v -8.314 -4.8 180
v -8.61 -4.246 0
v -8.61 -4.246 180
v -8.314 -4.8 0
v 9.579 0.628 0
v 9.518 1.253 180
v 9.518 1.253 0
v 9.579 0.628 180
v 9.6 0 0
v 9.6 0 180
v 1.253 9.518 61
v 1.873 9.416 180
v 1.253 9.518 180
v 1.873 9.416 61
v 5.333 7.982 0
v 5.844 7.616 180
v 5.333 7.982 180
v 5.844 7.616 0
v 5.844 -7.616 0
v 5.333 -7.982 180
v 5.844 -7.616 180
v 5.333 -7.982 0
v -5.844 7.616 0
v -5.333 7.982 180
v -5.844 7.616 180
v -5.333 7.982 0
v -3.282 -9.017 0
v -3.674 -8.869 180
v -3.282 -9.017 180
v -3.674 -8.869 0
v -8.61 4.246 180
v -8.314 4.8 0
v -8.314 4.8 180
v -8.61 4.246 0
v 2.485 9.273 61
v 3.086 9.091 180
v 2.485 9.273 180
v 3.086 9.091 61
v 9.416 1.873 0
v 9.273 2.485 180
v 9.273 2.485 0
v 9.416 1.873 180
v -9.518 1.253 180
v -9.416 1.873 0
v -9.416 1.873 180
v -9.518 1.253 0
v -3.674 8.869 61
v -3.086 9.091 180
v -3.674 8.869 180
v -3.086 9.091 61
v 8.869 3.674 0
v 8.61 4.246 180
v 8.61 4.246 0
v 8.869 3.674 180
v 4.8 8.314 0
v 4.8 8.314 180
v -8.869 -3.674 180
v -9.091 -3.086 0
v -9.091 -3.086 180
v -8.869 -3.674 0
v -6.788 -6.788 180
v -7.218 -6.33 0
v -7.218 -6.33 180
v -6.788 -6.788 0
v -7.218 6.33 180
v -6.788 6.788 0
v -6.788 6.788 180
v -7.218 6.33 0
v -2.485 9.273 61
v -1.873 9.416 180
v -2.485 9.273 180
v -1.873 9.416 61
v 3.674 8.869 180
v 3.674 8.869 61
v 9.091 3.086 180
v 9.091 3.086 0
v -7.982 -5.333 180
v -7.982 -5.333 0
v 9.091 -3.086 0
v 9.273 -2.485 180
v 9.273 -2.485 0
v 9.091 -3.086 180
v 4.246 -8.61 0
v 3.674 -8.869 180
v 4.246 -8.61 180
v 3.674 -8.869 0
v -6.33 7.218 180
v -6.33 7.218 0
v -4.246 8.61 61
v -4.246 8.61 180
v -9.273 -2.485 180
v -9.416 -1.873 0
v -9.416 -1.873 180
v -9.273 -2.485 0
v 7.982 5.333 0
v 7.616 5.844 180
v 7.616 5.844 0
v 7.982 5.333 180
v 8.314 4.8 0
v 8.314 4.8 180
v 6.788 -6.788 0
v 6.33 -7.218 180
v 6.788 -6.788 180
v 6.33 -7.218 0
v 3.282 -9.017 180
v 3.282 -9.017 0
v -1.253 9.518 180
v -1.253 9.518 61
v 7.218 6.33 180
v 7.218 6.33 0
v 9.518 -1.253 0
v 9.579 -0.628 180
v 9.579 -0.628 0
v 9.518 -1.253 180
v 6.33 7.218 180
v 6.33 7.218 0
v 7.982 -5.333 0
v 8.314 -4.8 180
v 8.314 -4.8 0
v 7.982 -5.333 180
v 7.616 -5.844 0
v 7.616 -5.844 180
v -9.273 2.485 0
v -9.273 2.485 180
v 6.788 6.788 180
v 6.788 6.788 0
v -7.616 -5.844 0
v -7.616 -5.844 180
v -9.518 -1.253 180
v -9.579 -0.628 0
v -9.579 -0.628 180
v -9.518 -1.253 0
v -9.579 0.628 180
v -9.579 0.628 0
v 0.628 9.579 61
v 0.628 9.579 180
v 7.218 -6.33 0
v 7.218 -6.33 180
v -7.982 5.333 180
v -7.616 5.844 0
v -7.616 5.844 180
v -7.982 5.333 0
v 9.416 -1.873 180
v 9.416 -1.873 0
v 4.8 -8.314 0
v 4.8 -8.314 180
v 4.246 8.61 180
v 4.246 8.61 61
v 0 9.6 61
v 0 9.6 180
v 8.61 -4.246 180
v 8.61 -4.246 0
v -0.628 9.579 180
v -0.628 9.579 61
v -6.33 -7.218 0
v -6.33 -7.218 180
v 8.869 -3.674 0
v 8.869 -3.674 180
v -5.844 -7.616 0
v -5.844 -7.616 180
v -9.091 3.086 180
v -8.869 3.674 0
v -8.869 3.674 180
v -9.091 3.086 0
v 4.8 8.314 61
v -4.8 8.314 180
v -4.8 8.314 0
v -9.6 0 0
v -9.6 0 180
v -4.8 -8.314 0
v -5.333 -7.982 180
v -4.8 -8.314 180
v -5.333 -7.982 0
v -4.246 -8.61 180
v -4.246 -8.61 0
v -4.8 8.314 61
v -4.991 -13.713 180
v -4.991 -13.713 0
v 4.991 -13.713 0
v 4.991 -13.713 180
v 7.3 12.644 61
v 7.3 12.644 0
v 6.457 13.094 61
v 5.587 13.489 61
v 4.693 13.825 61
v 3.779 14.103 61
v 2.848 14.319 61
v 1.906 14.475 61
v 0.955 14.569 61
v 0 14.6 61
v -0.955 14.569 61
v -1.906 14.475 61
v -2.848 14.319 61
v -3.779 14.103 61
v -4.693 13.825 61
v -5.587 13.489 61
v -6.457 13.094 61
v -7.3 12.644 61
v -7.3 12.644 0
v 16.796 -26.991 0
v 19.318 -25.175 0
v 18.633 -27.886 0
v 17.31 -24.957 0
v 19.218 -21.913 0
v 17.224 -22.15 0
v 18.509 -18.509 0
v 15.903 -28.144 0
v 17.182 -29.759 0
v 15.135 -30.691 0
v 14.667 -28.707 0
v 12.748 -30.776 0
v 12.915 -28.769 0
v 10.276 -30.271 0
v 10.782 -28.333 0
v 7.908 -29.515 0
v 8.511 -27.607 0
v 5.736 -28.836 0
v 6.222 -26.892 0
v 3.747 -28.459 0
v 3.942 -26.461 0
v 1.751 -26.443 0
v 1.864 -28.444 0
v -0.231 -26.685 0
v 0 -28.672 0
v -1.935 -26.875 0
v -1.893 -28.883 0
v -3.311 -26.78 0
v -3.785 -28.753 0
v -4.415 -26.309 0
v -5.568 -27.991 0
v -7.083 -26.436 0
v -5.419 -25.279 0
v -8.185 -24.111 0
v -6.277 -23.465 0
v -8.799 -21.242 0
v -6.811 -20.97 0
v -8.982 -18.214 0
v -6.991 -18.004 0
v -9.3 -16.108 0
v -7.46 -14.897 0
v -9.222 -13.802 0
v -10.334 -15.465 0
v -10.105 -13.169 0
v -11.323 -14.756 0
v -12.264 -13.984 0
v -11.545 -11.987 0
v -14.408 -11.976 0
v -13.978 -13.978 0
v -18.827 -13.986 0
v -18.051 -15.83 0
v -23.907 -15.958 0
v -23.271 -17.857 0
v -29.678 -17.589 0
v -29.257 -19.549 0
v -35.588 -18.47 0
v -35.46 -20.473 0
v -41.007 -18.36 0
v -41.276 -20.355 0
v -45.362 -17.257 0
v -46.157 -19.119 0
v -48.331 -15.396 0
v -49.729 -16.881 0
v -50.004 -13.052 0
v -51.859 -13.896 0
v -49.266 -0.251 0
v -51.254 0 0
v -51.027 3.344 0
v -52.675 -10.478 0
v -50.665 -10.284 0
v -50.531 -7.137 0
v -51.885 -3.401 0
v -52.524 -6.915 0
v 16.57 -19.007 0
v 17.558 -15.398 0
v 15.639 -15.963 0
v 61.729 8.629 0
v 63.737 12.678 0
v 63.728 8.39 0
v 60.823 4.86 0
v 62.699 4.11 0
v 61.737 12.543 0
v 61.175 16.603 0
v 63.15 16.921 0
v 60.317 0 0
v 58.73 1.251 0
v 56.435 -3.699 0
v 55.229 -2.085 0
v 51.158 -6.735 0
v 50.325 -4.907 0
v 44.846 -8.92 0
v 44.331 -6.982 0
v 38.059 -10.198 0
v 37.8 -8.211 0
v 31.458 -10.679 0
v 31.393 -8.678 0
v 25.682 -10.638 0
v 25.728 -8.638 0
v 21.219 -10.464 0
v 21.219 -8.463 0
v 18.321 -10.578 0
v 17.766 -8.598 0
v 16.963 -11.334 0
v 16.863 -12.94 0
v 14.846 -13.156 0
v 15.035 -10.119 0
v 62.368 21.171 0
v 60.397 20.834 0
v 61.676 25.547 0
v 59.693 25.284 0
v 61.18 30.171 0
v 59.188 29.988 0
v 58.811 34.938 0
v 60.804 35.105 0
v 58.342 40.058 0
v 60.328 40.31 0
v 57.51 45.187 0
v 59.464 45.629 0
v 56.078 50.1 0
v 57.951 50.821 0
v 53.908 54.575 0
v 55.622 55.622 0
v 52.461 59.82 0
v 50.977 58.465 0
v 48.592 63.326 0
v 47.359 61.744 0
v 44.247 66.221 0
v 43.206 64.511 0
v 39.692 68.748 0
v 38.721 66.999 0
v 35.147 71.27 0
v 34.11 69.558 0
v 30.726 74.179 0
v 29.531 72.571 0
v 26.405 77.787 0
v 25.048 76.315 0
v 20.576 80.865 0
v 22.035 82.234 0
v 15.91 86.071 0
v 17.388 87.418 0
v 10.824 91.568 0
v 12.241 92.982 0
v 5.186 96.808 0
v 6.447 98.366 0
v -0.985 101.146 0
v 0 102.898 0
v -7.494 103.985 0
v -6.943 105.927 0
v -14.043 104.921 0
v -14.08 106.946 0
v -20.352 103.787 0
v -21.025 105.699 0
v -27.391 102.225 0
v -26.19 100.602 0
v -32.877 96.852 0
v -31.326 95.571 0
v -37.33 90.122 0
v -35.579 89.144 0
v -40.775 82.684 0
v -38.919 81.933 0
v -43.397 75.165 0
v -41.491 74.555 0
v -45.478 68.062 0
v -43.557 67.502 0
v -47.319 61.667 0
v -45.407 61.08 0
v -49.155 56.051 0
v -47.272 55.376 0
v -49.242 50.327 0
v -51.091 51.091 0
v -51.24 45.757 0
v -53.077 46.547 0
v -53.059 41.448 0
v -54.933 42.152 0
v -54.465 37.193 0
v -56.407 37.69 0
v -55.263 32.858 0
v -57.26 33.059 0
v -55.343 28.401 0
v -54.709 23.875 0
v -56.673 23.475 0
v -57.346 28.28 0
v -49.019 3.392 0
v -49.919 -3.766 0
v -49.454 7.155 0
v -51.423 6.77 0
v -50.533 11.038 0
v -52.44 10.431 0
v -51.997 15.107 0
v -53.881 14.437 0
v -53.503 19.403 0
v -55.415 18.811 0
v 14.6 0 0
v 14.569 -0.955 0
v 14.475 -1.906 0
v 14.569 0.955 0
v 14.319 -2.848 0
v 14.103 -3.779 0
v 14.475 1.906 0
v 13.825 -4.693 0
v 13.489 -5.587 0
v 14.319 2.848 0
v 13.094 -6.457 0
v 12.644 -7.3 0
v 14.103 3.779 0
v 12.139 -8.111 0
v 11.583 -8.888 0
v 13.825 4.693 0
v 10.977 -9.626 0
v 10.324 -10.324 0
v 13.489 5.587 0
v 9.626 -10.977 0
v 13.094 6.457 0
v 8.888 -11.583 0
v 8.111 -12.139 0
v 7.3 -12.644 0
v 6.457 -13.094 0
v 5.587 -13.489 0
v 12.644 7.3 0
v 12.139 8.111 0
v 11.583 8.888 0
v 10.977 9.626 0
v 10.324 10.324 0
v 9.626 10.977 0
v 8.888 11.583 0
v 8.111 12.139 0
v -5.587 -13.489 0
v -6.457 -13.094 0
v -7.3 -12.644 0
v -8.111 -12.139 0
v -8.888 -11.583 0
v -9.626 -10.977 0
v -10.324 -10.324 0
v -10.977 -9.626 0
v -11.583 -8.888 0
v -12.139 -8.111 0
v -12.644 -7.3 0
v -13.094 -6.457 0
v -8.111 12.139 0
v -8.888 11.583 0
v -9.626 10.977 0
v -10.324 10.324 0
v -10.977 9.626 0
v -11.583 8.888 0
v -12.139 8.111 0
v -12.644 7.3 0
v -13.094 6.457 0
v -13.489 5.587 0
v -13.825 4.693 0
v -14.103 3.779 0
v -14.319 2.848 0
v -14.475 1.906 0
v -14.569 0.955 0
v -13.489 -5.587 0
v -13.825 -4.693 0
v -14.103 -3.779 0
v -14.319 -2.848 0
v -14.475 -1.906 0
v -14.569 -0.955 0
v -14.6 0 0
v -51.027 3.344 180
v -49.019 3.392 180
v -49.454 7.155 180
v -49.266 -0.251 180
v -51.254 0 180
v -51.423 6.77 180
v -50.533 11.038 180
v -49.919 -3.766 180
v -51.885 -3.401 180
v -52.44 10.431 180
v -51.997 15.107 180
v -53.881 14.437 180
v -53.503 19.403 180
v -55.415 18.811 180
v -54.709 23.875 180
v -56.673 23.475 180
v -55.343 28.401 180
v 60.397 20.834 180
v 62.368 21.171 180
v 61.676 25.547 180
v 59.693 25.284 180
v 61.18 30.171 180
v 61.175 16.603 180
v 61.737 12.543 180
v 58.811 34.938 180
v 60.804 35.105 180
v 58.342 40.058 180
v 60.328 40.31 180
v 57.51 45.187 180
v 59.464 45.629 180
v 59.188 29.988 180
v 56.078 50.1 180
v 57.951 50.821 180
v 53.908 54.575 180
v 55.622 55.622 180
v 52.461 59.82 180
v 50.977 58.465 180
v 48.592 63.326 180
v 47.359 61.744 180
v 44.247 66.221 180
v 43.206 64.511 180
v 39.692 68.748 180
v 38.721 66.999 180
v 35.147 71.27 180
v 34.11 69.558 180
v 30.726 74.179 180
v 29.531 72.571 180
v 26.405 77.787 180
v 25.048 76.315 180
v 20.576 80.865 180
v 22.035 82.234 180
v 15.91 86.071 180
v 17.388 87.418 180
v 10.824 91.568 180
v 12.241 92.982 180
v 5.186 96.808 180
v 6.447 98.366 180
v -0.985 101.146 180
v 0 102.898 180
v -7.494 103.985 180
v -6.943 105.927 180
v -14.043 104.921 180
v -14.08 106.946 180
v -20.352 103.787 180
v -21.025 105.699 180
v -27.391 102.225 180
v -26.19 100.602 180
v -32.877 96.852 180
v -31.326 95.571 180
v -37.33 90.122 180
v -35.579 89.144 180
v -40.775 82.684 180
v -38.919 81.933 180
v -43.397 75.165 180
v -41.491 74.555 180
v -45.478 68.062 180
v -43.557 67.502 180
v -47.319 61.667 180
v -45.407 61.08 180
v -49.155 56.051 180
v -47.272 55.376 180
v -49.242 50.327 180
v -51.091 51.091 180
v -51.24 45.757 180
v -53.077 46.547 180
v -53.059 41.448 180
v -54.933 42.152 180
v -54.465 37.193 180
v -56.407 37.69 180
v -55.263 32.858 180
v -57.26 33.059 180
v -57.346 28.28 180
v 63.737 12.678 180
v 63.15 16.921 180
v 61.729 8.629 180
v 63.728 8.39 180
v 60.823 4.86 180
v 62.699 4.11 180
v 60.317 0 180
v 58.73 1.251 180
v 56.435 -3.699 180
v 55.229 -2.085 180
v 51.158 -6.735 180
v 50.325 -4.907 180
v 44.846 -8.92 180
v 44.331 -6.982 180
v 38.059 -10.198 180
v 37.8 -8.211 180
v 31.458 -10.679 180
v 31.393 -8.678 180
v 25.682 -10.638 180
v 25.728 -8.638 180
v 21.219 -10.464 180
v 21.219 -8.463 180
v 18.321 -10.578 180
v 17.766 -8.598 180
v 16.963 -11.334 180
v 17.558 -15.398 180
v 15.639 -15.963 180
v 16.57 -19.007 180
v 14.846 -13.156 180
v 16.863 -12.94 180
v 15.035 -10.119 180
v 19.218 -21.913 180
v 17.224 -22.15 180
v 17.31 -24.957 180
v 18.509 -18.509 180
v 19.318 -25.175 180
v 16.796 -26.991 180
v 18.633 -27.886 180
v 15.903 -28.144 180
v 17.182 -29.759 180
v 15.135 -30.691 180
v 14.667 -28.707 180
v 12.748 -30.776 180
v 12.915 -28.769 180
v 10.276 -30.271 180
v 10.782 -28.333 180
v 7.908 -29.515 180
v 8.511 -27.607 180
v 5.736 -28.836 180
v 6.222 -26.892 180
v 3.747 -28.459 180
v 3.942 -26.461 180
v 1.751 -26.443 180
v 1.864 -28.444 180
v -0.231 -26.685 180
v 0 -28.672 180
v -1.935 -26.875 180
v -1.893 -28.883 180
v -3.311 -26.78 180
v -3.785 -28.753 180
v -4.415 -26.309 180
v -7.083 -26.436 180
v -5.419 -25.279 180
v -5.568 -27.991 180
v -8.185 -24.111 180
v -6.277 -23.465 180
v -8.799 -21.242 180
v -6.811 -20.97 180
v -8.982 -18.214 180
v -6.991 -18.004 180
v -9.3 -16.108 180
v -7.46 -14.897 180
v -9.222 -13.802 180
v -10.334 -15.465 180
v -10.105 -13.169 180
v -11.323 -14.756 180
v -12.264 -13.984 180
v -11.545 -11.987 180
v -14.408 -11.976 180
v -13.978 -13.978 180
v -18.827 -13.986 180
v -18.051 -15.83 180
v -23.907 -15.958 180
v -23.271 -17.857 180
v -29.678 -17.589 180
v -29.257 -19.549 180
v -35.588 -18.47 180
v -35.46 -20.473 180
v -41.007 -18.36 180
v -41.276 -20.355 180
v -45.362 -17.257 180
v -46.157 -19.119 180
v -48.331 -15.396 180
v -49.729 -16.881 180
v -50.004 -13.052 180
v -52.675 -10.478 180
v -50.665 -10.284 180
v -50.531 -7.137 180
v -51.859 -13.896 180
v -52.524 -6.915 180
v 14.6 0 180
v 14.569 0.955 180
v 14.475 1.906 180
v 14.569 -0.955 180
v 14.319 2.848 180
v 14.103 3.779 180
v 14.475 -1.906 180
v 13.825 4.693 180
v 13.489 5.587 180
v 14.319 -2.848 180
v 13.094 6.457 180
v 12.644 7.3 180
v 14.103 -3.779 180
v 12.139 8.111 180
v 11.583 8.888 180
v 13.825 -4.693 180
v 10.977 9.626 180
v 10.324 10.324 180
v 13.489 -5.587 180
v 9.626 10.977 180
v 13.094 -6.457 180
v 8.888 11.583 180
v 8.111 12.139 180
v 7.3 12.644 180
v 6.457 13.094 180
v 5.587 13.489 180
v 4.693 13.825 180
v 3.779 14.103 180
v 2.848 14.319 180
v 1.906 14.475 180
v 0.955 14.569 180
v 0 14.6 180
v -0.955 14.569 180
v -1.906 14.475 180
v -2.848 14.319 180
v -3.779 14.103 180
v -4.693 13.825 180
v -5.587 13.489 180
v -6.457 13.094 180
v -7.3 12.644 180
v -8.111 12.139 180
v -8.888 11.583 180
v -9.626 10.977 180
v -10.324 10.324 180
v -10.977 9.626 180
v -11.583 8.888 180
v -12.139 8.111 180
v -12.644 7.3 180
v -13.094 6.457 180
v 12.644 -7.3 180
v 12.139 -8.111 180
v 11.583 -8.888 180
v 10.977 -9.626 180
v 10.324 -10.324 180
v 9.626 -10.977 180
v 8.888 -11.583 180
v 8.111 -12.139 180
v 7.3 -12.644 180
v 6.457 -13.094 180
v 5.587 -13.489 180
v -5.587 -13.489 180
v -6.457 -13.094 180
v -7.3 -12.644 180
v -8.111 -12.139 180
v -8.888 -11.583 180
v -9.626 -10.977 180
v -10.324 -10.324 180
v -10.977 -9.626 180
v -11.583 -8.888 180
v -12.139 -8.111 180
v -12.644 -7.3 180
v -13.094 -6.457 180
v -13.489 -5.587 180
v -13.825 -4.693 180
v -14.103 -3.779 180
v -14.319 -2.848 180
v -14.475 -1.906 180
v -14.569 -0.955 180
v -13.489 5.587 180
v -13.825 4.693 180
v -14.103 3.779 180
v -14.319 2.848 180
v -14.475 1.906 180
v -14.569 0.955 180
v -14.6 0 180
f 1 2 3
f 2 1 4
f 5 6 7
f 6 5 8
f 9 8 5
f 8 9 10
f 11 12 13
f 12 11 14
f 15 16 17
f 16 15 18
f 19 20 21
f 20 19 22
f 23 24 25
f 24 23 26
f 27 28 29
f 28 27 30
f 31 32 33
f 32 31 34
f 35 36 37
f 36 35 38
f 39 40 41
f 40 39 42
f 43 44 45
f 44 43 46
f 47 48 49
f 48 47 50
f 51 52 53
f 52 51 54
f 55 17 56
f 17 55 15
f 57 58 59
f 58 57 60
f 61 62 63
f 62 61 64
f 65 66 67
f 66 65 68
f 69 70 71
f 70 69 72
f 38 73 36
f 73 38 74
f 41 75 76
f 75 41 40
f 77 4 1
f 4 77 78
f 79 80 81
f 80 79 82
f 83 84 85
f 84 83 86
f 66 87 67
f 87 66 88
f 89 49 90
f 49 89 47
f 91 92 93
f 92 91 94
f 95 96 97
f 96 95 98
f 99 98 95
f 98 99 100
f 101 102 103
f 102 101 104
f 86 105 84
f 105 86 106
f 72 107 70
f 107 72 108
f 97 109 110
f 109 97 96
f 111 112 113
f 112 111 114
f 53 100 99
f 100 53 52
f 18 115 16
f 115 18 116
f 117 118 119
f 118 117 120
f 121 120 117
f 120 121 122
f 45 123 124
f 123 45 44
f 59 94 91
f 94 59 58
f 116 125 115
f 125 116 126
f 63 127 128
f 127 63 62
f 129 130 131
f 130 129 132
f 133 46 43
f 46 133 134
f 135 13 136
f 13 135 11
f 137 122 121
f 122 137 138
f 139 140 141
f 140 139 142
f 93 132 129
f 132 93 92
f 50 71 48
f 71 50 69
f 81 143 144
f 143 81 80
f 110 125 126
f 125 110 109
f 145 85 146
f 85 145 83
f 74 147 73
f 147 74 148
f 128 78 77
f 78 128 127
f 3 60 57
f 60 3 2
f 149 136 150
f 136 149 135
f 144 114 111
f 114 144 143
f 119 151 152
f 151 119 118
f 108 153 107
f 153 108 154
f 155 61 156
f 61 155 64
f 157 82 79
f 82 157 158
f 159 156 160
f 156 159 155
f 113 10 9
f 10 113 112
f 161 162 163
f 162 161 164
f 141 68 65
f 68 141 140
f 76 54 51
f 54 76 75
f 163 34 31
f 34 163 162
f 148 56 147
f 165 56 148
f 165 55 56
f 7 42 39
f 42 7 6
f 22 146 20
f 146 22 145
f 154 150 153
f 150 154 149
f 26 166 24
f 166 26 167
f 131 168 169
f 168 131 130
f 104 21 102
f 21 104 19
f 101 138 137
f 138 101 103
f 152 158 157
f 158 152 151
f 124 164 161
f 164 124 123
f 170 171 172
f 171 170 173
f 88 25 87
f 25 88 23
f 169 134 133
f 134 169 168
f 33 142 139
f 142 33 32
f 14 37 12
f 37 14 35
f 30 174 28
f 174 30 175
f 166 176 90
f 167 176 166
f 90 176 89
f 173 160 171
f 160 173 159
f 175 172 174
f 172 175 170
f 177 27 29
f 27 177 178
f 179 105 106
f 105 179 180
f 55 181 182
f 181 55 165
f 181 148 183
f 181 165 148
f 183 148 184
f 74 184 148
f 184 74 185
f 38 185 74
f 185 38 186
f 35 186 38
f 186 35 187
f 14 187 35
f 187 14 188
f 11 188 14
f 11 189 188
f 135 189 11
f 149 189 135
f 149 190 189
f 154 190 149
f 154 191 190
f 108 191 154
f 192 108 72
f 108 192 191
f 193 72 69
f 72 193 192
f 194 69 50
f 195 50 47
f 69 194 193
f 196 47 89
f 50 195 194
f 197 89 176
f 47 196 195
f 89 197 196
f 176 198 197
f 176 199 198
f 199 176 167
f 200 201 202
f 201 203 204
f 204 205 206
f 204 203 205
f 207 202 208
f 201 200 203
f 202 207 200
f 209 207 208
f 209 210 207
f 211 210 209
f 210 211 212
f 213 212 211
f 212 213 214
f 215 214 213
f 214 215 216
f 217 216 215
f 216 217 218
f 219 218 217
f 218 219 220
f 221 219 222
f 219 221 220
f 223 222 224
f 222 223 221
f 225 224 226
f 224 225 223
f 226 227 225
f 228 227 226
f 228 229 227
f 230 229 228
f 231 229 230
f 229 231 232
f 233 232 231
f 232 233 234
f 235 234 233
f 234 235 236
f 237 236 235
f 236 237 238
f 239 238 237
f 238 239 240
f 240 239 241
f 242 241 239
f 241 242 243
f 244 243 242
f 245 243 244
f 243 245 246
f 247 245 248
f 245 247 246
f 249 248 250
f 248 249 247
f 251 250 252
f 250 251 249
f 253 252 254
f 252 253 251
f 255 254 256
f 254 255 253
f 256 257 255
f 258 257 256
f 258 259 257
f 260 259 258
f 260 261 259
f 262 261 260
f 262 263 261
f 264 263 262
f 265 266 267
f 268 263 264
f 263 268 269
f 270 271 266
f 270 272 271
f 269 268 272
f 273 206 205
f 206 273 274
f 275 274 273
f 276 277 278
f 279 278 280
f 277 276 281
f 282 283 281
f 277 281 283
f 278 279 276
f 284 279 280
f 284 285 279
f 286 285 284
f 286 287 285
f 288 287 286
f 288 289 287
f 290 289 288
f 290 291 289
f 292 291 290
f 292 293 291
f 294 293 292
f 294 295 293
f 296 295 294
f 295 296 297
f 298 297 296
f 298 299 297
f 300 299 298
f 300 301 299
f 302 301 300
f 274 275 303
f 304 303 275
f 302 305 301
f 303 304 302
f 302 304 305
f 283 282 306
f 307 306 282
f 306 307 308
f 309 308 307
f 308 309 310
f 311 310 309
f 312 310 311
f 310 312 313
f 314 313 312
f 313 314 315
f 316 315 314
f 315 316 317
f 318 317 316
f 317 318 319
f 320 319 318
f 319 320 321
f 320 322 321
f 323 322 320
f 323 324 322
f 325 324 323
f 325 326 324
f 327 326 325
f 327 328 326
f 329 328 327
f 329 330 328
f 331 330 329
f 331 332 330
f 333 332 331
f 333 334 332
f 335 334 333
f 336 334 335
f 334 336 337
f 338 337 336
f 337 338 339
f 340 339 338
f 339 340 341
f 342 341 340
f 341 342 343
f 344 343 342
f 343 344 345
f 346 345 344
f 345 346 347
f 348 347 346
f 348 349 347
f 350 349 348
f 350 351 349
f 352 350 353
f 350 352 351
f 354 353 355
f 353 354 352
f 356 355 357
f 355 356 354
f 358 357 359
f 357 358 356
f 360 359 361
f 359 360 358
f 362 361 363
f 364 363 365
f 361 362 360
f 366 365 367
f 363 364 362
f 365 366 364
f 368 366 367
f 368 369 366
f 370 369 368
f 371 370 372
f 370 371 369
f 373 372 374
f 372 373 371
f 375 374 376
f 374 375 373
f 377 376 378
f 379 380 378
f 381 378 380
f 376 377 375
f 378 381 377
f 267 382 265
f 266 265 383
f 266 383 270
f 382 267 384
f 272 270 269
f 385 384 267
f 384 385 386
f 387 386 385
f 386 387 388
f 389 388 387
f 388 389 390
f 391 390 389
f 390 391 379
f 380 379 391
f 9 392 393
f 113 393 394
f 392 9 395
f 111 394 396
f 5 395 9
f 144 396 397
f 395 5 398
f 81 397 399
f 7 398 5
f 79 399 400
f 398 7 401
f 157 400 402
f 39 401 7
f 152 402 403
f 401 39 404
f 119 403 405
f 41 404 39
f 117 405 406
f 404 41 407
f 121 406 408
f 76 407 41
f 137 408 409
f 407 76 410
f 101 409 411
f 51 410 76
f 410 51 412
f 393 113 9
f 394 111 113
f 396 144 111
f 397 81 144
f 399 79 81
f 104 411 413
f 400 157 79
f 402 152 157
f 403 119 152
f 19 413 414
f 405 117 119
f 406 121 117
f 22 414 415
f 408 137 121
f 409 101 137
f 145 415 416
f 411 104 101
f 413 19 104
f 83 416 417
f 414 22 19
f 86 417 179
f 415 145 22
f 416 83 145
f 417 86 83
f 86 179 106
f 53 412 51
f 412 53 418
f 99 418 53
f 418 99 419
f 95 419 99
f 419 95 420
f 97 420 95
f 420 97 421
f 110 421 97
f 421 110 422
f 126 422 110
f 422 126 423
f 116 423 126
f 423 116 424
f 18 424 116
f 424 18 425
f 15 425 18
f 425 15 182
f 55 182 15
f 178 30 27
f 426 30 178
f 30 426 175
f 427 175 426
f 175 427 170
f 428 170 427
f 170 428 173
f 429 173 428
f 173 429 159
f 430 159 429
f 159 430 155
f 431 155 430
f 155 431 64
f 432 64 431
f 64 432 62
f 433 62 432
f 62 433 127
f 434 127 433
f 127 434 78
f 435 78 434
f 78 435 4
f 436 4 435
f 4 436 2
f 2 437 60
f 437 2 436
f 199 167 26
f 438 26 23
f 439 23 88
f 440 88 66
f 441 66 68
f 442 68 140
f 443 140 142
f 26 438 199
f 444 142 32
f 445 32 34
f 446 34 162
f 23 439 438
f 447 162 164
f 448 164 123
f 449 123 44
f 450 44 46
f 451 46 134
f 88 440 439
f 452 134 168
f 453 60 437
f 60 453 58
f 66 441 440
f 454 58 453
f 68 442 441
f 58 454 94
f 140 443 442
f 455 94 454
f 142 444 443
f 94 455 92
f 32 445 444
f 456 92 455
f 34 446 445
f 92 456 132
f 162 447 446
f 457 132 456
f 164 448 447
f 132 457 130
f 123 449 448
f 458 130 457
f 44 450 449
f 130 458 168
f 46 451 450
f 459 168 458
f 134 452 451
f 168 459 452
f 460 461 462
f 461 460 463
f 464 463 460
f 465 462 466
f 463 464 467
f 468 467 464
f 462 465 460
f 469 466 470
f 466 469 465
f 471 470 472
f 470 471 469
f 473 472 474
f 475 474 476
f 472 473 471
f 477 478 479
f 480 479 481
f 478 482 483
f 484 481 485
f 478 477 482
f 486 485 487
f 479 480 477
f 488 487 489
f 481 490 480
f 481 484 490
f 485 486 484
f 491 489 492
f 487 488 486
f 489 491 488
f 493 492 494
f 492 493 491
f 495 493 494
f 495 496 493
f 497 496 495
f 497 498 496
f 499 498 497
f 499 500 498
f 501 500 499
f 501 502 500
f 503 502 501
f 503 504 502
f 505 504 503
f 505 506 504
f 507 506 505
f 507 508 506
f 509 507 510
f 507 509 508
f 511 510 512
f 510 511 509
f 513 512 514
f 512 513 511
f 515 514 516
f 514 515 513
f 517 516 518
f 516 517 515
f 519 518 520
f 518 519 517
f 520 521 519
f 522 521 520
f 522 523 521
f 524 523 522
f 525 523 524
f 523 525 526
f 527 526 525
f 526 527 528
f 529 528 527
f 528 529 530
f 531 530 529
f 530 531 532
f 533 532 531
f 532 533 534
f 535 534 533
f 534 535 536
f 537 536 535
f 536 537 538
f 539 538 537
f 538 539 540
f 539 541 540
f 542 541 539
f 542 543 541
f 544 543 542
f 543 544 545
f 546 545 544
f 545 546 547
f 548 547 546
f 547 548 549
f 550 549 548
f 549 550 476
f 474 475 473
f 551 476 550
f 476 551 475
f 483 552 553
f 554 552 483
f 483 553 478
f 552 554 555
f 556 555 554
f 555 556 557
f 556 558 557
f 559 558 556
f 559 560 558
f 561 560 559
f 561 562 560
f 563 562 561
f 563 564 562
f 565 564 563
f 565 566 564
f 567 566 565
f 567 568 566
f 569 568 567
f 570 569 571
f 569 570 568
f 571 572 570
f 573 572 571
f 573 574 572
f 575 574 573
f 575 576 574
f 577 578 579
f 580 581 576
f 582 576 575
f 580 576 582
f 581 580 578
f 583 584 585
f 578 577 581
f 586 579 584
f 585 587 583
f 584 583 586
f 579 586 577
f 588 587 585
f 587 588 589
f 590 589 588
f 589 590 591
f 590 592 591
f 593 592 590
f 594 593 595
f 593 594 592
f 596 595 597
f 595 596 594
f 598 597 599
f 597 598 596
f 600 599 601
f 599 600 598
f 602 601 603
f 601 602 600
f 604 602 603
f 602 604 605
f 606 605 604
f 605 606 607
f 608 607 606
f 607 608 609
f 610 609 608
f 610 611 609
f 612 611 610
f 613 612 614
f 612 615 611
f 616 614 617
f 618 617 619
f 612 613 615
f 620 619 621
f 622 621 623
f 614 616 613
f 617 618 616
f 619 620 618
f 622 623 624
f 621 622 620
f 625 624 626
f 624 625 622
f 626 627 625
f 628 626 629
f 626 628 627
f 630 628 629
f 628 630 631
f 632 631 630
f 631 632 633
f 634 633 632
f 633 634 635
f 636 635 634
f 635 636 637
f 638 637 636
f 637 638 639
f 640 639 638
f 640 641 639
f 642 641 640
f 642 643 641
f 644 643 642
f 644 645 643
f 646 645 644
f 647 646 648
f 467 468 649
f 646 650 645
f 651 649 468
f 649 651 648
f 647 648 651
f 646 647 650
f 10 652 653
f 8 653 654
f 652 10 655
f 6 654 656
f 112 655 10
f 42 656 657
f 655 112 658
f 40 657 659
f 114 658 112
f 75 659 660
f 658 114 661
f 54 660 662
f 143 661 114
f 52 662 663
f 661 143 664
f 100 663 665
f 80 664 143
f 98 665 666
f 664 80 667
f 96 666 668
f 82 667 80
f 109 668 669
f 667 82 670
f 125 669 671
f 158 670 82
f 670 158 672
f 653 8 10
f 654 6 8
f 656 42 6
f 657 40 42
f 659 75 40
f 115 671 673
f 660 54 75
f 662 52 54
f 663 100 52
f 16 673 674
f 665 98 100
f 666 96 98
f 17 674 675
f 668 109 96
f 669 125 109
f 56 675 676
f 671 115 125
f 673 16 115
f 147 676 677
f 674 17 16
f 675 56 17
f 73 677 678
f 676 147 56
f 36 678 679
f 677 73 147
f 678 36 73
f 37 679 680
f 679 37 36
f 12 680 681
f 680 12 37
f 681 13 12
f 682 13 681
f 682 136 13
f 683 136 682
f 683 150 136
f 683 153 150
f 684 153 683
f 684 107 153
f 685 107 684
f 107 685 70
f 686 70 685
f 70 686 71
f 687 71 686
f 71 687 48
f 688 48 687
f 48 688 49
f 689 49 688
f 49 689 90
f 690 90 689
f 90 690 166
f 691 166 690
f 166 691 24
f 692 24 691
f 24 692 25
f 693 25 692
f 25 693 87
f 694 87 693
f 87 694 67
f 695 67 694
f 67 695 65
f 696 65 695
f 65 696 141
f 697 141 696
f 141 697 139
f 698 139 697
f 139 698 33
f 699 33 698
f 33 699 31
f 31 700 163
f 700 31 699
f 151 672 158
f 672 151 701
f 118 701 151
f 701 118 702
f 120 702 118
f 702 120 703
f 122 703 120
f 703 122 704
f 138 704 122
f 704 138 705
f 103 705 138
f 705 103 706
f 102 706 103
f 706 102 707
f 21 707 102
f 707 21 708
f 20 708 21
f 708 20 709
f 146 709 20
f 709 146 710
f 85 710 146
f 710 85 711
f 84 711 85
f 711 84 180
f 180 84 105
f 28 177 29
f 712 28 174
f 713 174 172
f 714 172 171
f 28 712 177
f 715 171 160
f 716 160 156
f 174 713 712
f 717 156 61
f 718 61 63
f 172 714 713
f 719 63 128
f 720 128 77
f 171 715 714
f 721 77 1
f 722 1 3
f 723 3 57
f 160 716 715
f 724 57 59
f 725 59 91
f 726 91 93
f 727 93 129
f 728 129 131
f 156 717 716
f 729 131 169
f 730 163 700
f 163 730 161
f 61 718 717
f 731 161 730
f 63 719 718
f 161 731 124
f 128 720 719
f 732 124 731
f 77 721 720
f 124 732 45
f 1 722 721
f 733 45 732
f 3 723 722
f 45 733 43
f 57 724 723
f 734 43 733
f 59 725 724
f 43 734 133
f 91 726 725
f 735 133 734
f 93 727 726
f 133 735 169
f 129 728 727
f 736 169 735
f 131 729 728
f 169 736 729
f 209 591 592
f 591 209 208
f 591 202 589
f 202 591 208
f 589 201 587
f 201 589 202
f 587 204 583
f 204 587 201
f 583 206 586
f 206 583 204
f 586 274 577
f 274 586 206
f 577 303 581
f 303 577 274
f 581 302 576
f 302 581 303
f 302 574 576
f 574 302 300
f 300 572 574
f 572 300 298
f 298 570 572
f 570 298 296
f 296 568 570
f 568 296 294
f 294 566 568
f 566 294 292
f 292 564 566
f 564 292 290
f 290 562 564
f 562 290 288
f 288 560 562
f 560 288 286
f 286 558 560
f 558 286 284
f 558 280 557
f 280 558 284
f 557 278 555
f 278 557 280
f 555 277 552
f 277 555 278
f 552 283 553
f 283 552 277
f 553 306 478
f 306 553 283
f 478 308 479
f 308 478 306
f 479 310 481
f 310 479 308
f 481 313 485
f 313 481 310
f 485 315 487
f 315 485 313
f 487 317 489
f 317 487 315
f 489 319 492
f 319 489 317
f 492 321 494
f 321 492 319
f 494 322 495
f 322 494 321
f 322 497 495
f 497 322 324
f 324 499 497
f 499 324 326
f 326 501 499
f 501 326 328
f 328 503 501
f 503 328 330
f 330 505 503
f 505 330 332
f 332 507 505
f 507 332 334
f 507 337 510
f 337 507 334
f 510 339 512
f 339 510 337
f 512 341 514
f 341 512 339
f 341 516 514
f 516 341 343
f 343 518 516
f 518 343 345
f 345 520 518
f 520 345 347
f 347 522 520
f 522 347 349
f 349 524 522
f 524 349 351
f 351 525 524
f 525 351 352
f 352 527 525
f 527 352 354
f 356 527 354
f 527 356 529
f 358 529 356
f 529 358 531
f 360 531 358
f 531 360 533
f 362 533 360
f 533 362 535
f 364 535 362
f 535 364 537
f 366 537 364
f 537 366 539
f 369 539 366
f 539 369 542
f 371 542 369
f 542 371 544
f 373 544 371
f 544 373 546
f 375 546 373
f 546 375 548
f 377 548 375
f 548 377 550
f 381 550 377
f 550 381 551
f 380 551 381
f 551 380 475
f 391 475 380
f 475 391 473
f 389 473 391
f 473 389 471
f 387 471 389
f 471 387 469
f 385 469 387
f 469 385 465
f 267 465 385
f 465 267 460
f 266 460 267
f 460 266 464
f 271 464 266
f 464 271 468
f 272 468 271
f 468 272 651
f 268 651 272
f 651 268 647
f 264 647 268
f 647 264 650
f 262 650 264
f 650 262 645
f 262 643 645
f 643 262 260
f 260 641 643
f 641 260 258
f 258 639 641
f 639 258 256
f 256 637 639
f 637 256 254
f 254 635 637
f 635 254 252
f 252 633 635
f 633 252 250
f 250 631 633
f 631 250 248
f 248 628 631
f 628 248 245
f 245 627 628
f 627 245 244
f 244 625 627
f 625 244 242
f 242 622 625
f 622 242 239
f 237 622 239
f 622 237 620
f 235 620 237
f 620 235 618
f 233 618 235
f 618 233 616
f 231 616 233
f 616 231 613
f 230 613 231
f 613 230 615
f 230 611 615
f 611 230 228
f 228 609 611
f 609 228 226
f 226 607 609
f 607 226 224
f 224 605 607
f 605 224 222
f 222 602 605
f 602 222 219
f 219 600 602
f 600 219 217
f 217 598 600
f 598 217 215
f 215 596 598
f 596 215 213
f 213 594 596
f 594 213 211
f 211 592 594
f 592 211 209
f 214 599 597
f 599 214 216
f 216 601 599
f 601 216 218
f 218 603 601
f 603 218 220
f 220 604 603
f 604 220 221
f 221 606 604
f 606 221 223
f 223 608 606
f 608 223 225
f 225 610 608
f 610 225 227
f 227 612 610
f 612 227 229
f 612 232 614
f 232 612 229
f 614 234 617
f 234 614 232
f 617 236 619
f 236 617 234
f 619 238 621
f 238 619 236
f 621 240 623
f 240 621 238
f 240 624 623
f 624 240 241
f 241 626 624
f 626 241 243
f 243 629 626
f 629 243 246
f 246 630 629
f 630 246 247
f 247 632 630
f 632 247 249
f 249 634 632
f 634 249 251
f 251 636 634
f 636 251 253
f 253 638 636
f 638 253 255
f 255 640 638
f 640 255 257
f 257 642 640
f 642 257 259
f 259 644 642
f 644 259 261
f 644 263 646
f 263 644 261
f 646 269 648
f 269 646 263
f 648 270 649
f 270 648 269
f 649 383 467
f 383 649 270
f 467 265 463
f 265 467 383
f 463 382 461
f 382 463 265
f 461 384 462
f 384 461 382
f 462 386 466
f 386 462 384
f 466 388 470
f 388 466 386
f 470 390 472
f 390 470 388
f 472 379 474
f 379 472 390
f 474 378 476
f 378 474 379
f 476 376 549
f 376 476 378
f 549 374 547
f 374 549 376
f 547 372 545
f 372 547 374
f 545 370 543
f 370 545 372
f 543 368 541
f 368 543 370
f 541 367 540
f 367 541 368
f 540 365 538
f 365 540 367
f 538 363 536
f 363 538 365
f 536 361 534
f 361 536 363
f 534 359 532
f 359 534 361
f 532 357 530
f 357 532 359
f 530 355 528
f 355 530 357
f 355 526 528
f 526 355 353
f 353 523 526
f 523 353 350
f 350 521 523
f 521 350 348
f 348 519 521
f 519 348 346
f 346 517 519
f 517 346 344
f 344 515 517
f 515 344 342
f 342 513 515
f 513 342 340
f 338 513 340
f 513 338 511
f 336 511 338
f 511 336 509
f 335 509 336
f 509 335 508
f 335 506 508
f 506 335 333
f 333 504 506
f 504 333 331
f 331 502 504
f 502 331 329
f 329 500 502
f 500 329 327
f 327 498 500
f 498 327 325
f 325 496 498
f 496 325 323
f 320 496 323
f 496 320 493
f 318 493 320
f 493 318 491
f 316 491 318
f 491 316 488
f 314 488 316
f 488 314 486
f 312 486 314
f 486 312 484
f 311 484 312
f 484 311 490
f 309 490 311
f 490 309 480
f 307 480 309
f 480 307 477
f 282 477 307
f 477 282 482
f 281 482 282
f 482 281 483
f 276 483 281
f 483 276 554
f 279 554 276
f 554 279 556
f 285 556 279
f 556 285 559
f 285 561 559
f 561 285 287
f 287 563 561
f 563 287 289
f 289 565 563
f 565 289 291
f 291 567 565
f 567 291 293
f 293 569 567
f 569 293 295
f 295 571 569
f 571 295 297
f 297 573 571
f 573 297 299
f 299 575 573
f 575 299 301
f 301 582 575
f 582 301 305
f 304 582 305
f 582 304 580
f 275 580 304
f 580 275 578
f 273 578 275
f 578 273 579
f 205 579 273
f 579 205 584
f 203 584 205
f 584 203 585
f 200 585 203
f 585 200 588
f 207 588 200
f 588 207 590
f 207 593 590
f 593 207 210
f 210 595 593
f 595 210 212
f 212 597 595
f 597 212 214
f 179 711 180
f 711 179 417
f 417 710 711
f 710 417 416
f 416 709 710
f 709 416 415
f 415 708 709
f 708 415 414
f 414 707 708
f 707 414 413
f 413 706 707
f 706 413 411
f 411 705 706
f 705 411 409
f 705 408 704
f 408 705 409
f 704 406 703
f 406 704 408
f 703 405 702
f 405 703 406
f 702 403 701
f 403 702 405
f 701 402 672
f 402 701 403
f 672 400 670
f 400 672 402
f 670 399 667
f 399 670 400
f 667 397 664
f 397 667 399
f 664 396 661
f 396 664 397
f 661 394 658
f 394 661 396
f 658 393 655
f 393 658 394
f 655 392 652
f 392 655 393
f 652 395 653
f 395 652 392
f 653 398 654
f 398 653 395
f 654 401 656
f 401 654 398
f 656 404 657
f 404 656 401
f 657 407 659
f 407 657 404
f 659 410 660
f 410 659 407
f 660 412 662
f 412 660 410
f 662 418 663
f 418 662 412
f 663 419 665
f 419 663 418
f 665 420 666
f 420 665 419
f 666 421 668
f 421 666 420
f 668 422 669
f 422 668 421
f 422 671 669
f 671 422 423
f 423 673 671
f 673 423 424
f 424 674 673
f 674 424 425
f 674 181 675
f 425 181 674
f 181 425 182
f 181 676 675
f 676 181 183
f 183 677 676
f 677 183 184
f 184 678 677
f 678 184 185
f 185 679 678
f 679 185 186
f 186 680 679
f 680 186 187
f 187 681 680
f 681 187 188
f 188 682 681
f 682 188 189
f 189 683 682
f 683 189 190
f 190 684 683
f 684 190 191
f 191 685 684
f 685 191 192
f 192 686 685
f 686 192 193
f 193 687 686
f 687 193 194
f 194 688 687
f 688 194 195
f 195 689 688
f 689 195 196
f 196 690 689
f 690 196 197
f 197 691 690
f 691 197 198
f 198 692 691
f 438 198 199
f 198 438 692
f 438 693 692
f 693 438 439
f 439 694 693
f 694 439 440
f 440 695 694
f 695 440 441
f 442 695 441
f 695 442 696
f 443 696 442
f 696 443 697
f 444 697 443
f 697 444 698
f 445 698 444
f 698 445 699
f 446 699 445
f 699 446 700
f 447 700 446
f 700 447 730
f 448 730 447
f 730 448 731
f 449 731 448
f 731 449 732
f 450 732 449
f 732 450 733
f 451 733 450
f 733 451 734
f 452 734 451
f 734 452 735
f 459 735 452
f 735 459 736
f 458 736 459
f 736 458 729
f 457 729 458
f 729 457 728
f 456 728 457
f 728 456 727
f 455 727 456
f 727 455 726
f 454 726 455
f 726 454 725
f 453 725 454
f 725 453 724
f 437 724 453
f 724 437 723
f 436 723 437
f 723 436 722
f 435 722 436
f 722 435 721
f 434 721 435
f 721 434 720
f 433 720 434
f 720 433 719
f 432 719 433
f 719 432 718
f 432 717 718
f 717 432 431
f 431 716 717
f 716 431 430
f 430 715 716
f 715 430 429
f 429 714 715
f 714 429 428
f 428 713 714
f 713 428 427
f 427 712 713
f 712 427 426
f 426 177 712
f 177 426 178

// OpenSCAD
// Lampenschirm für Stehlampe – organischer, wellenförmiger Querschnitt
// mit Klemmkragen, der in die Form integriert ist (keine D-Form mehr)
// Alle Maße in Millimetern (Regel: units-mm)
//
// Kontext: context/printer.md, context/tolerances.md und context/materials.md
// waren zum Zeitpunkt der Modellierung leer (siehe Regel: context-first).
// Annahmen aus dem Design-Dialog (siehe auch 001/002):
//   - Baubett >= 200mm Z-Höhe vorhanden -> Schirm wird als ein Teil,
//     stehend, in voller Höhe gedruckt.
//   - Klemmkragen als offener Federclip (C-Ring): Innendurchmesser 0.8mm
//     unter Stangendurchmesser (19.2mm ID auf 20mm Stange) für Vorspannung.
//   - E14-Fassung wird separat an der Stange montiert.
//
// Änderungen gegenüber 002 (Nutzer-Feedback: "weg von der D-Form, organischer"):
//   - Der Querschnitt ist jetzt eine glatte, asymmetrische, wellenförmige
//     Freiform-Kurve (Fourier-Basisform + zwei Wellen-Harmonische) statt
//     flacher Rückseite + halbovaler Front. Bleibt weiterhin als konstanter
//     Querschnitt über die volle Höhe extrudiert (keine Verjüngung).
//   - Die Rückseite hat keine scharfe Kante mehr: die Kontur läuft glatt um
//     den Klemmkragen herum. Der Kragen ist dadurch kein aufgesetzter
//     Zylinder mehr, sondern eine massive "Boss"-Zone innerhalb der
//     ohnehin an dieser Stelle dickeren organischen Wand.
//   - Sicherheitsabstand (min_r / boss_r) stellt rechnerisch sicher, dass
//     die Wellenkontur den Klemmkragen nie schneidet, auch nicht an den
//     tiefsten Punkten der Welle.

// ---- Parameter ----
shade_height = 180;   // Gesamthöhe des Schirms
wall_t       = 2;     // Wandstärke Schirm (dünn für Lichtdurchlässigkeit)

rod_d      = 20;                 // Durchmesser der Metallstange
rod_r      = rod_d / 2;
clip_id    = 19.2;               // Innendurchmesser Klemmkragen (Vorspannung, ~0.8mm Untermaß)
clip_r_in  = clip_id / 2;
clip_wall  = 3;                  // Wandstärke Klemmkragen (dicker als Schirmwand, für Klemmkraft)
clip_r_out = clip_r_in + clip_wall;
clip_gap_deg = 40;               // Öffnungswinkel des C-Rings (Montagespalt, zeigt nach -Y)

socket_slot_deg    = 60;              // Öffnungswinkel des Fassungs-Schlitzes (Innenseite, +Y) - Annahme
socket_slot_height = shade_height / 3; // unteres Drittel der Klemme ist auf der Innenseite offen

// Organische Grundform (Fourier-Basis, Radius in mm ab Stangenmitte):
// front (θ=90°, +Y) ≈ 95mm, Seiten (θ=0°/180°) ≈ 50mm, Rückseite (θ=270°, -Y) ≈ 25mm
base_a0 = 55;
base_a1 = 35;
base_a2 = 5;

// Wellen-Überlagerung für den organischen/wellenförmigen Look
wave_amp1 = 9;   wave_freq1 = 4;  wave_phase1 = 40;
wave_amp2 = 5;   wave_freq2 = 7;  wave_phase2 = 115;

min_r = clip_r_out + 6;   // harte Untergrenze: Kontur darf den Klemmkragen nie schneiden
boss_r = clip_r_out + 2;  // Radius der massiven Zone um den Klemmkragen (liegt sicher innerhalb min_r - wall_t)

$fn = 96;

// Radius der organischen Kontur in Abhängigkeit vom Winkel θ (Grad)
function organic_r(theta) =
    let(phi = theta - 90)
    let(base = base_a0 + base_a1 * cos(phi) + base_a2 * cos(2 * phi))
    let(wave = wave_amp1 * sin(wave_freq1 * theta + wave_phase1)
             + wave_amp2 * sin(wave_freq2 * theta + wave_phase2))
    max(base + wave, min_r);

// Geschlossenes 2D-Profil der organischen Außenkontur
module organic_outline() {
    step = 360 / $fn;
    polygon(points = [
        for (t = [0 : step : 360 - step])
            [organic_r(t) * cos(t), organic_r(t) * sin(t)]
    ]);
}

// 2D-Profil der Wand: normale 2mm-Schale überall, aber massiv (kein Hohlraum)
// in der boss_r-Zone um den Klemmkragen, damit dieser fest mit der Wand
// verbunden ist statt frei im Hohlraum zu schweben.
module shell_with_boss_2d() {
    difference() {
        organic_outline();
        difference() {
            offset(delta = -wall_t)
                organic_outline();
            circle(r = boss_r);
        }
    }
}

module organic_shell() {
    linear_extrude(height = shade_height)
        shell_with_boss_2d();
}

// Keilförmiger 2D-Ausschnitt, zentriert auf Winkel 0
module pie_wedge_2d(radius, angle_deg) {
    a = angle_deg / 2;
    polygon(points = [
        [0, 0],
        [radius * cos(a), radius * sin(a)],
        [radius * cos(-a), radius * sin(-a)]
    ]);
}

// Radialer Schlitz von z0 bis z1, in Richtung facing_deg ausgerichtet
module radial_slot(radius, angle_deg, facing_deg, z0, z1) {
    translate([0, 0, z0])
        rotate([0, 0, facing_deg])
            linear_extrude(z1 - z0)
                pie_wedge_2d(radius, angle_deg);
}

// Alle Ausschnitte für die Klemme: durchgehende Stangenbohrung + Montagespalt
// (volle Höhe, -Y) + Fassungs-Schlitz (unteres Drittel, +Y)
module clamp_cutouts() {
    union() {
        translate([0, 0, -1])
            cylinder(r = clip_r_in, h = shade_height + 2);

        radial_slot(clip_r_out + 5, clip_gap_deg, 270, -1, shade_height + 1);

        radial_slot(clip_r_out + 5, socket_slot_deg, 90, -1, socket_slot_height + 1);
    }
}

// render() erzwingt die vollständige (exakte) Boolesche Berechnung statt der
// schnellen OpenCSG-Live-Vorschau, damit die Klemme auch in der OpenSCAD-
// Vorschau (F5) korrekt offen dargestellt wird.
render(convexity = 10)
    difference() {
        organic_shell();
        clamp_cutouts();
    }
